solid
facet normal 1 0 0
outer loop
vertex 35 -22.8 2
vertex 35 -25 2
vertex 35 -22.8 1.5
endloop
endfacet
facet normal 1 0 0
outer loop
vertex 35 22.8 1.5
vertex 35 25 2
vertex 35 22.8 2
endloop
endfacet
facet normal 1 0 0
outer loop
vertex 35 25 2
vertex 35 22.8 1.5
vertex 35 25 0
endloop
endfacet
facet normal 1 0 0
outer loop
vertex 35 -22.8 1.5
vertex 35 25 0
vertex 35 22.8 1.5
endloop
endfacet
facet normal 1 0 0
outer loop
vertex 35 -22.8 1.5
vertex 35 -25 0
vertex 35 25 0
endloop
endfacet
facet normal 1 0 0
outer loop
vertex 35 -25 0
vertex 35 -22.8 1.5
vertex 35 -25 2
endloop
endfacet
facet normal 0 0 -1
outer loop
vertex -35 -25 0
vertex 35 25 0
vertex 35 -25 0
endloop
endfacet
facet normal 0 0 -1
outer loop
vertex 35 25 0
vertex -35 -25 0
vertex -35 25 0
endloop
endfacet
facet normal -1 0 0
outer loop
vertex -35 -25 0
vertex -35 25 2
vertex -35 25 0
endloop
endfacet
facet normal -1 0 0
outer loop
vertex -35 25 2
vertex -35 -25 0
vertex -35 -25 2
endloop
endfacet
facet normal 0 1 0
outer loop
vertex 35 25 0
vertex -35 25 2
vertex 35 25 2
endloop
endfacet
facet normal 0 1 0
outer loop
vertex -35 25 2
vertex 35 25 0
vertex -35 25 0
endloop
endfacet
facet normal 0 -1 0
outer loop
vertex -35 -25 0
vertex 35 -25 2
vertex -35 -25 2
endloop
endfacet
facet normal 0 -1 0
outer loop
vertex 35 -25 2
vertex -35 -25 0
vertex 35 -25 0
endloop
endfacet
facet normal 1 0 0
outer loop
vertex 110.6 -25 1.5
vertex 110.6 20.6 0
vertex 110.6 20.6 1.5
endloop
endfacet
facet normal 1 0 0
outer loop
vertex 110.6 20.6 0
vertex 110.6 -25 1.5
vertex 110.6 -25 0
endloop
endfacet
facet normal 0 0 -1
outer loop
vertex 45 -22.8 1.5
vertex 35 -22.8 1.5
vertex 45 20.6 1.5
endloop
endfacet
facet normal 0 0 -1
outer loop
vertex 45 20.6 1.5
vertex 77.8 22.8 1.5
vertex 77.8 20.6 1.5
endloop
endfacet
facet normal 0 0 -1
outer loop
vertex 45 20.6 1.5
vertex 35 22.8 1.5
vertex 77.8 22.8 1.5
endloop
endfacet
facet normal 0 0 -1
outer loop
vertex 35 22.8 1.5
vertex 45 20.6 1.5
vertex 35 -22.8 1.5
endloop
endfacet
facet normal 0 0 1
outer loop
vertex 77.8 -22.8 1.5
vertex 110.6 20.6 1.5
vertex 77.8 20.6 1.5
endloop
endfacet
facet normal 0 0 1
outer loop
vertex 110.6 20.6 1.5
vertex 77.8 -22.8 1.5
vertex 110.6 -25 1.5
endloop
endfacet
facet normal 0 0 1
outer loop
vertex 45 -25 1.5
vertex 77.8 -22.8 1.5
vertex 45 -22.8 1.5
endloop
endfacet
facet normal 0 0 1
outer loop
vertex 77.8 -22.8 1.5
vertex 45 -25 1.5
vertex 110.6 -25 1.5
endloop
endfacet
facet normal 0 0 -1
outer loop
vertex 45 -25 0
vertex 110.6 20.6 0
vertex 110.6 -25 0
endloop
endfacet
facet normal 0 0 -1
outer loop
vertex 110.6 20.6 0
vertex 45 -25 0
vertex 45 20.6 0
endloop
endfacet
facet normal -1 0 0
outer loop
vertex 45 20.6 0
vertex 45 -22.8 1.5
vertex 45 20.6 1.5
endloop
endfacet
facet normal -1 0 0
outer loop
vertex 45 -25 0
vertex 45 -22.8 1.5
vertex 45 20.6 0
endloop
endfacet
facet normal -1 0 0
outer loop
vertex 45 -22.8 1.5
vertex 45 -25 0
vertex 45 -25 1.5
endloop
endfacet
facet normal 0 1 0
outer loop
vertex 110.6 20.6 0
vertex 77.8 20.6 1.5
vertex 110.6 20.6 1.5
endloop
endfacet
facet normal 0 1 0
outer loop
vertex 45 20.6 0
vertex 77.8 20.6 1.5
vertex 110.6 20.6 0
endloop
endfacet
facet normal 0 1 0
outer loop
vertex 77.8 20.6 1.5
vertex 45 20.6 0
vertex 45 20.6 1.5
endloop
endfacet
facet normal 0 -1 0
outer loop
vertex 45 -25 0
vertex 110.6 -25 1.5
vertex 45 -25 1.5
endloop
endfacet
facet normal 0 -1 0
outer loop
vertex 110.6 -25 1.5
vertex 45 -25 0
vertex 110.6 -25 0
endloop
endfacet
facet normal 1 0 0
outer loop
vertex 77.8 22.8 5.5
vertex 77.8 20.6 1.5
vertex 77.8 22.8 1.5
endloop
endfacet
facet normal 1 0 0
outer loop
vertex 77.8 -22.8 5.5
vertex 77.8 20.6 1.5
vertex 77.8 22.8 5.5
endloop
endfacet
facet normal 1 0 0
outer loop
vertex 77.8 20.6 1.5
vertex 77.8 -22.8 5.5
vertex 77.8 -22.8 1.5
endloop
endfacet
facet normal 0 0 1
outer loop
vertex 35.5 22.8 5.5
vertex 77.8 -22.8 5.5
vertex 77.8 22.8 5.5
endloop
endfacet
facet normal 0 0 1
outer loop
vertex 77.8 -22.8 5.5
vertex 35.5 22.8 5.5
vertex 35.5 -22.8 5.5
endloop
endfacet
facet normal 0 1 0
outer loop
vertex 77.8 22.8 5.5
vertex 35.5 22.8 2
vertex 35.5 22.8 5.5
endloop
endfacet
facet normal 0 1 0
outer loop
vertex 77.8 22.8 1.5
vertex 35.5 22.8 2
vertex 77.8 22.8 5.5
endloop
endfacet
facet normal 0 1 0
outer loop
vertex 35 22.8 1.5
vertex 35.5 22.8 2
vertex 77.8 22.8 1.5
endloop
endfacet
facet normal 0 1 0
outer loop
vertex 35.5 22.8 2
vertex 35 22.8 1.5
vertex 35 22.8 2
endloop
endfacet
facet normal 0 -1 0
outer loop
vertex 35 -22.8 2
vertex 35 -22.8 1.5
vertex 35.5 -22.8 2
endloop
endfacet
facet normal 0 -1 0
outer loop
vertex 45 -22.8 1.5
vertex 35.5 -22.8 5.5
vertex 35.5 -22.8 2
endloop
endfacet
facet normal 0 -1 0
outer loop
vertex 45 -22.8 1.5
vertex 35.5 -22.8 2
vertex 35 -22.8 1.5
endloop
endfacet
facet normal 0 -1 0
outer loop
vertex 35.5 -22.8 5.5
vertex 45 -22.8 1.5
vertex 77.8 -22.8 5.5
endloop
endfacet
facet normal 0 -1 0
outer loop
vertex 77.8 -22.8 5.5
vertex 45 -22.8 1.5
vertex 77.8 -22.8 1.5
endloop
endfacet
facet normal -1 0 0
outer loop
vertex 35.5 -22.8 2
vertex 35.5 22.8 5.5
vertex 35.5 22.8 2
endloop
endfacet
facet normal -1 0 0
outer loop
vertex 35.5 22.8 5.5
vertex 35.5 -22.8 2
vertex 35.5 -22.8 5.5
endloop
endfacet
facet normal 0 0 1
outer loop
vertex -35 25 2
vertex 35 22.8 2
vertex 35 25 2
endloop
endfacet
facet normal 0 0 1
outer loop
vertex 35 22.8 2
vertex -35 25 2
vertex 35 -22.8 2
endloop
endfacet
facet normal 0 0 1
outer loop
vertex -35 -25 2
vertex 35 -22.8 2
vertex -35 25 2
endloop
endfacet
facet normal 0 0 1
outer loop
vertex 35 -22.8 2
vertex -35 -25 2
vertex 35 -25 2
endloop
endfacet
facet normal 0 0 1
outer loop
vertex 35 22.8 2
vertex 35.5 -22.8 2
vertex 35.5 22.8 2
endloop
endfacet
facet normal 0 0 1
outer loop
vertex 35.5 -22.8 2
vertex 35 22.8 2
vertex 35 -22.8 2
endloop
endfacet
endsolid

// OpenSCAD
// Two-part enclosure for small electronics board
// Print orientation: both parts on the bed, lid on +X side of box

// ---- Box ----
box_x = 70;      // outer length (X)
box_y = 50;      // outer width (Y)
box_z = 30;      // outer height (Z)
wall = 2;        // wall thickness
floor = 2;       // floor thickness

// ---- Lid ----
lip_w = 65.6;    // lip outer length (X)
lip_d = 45.6;    // lip outer width (Y)
lip_h = 4;       // lip height (Z)
lip_t = 1.5;     // lip wall thickness

// ---- Misc ----
eps = 0.5;       // cutter overshoot
gap = 10;        // gap between parts

$fn = 64;

difference() {
    union() {
        // Box (open top)
        translate([-box_x/2, -box_y/2, 0])
            cube([box_x, box_y, box_z - floor]);
        // Lid (plate + lip, printed upside down)
        translate([box_x/2 + gap, -box_y/2, 0])
            cube([lip_w, lip_d, lip_t]);
        translate([box_x/2 + gap - lip_w/2, -lip_d/2, lip_t])
            cube([lip_w, lip_d, lip_h]);
    }
    // Cut out the box interior (open top)
    translate([-box_x/2 - eps, -box_y/2 - eps, floor])
        cube([box_x + 2*eps, box_y + 2*eps, box_z - floor + 0.01]);
}
